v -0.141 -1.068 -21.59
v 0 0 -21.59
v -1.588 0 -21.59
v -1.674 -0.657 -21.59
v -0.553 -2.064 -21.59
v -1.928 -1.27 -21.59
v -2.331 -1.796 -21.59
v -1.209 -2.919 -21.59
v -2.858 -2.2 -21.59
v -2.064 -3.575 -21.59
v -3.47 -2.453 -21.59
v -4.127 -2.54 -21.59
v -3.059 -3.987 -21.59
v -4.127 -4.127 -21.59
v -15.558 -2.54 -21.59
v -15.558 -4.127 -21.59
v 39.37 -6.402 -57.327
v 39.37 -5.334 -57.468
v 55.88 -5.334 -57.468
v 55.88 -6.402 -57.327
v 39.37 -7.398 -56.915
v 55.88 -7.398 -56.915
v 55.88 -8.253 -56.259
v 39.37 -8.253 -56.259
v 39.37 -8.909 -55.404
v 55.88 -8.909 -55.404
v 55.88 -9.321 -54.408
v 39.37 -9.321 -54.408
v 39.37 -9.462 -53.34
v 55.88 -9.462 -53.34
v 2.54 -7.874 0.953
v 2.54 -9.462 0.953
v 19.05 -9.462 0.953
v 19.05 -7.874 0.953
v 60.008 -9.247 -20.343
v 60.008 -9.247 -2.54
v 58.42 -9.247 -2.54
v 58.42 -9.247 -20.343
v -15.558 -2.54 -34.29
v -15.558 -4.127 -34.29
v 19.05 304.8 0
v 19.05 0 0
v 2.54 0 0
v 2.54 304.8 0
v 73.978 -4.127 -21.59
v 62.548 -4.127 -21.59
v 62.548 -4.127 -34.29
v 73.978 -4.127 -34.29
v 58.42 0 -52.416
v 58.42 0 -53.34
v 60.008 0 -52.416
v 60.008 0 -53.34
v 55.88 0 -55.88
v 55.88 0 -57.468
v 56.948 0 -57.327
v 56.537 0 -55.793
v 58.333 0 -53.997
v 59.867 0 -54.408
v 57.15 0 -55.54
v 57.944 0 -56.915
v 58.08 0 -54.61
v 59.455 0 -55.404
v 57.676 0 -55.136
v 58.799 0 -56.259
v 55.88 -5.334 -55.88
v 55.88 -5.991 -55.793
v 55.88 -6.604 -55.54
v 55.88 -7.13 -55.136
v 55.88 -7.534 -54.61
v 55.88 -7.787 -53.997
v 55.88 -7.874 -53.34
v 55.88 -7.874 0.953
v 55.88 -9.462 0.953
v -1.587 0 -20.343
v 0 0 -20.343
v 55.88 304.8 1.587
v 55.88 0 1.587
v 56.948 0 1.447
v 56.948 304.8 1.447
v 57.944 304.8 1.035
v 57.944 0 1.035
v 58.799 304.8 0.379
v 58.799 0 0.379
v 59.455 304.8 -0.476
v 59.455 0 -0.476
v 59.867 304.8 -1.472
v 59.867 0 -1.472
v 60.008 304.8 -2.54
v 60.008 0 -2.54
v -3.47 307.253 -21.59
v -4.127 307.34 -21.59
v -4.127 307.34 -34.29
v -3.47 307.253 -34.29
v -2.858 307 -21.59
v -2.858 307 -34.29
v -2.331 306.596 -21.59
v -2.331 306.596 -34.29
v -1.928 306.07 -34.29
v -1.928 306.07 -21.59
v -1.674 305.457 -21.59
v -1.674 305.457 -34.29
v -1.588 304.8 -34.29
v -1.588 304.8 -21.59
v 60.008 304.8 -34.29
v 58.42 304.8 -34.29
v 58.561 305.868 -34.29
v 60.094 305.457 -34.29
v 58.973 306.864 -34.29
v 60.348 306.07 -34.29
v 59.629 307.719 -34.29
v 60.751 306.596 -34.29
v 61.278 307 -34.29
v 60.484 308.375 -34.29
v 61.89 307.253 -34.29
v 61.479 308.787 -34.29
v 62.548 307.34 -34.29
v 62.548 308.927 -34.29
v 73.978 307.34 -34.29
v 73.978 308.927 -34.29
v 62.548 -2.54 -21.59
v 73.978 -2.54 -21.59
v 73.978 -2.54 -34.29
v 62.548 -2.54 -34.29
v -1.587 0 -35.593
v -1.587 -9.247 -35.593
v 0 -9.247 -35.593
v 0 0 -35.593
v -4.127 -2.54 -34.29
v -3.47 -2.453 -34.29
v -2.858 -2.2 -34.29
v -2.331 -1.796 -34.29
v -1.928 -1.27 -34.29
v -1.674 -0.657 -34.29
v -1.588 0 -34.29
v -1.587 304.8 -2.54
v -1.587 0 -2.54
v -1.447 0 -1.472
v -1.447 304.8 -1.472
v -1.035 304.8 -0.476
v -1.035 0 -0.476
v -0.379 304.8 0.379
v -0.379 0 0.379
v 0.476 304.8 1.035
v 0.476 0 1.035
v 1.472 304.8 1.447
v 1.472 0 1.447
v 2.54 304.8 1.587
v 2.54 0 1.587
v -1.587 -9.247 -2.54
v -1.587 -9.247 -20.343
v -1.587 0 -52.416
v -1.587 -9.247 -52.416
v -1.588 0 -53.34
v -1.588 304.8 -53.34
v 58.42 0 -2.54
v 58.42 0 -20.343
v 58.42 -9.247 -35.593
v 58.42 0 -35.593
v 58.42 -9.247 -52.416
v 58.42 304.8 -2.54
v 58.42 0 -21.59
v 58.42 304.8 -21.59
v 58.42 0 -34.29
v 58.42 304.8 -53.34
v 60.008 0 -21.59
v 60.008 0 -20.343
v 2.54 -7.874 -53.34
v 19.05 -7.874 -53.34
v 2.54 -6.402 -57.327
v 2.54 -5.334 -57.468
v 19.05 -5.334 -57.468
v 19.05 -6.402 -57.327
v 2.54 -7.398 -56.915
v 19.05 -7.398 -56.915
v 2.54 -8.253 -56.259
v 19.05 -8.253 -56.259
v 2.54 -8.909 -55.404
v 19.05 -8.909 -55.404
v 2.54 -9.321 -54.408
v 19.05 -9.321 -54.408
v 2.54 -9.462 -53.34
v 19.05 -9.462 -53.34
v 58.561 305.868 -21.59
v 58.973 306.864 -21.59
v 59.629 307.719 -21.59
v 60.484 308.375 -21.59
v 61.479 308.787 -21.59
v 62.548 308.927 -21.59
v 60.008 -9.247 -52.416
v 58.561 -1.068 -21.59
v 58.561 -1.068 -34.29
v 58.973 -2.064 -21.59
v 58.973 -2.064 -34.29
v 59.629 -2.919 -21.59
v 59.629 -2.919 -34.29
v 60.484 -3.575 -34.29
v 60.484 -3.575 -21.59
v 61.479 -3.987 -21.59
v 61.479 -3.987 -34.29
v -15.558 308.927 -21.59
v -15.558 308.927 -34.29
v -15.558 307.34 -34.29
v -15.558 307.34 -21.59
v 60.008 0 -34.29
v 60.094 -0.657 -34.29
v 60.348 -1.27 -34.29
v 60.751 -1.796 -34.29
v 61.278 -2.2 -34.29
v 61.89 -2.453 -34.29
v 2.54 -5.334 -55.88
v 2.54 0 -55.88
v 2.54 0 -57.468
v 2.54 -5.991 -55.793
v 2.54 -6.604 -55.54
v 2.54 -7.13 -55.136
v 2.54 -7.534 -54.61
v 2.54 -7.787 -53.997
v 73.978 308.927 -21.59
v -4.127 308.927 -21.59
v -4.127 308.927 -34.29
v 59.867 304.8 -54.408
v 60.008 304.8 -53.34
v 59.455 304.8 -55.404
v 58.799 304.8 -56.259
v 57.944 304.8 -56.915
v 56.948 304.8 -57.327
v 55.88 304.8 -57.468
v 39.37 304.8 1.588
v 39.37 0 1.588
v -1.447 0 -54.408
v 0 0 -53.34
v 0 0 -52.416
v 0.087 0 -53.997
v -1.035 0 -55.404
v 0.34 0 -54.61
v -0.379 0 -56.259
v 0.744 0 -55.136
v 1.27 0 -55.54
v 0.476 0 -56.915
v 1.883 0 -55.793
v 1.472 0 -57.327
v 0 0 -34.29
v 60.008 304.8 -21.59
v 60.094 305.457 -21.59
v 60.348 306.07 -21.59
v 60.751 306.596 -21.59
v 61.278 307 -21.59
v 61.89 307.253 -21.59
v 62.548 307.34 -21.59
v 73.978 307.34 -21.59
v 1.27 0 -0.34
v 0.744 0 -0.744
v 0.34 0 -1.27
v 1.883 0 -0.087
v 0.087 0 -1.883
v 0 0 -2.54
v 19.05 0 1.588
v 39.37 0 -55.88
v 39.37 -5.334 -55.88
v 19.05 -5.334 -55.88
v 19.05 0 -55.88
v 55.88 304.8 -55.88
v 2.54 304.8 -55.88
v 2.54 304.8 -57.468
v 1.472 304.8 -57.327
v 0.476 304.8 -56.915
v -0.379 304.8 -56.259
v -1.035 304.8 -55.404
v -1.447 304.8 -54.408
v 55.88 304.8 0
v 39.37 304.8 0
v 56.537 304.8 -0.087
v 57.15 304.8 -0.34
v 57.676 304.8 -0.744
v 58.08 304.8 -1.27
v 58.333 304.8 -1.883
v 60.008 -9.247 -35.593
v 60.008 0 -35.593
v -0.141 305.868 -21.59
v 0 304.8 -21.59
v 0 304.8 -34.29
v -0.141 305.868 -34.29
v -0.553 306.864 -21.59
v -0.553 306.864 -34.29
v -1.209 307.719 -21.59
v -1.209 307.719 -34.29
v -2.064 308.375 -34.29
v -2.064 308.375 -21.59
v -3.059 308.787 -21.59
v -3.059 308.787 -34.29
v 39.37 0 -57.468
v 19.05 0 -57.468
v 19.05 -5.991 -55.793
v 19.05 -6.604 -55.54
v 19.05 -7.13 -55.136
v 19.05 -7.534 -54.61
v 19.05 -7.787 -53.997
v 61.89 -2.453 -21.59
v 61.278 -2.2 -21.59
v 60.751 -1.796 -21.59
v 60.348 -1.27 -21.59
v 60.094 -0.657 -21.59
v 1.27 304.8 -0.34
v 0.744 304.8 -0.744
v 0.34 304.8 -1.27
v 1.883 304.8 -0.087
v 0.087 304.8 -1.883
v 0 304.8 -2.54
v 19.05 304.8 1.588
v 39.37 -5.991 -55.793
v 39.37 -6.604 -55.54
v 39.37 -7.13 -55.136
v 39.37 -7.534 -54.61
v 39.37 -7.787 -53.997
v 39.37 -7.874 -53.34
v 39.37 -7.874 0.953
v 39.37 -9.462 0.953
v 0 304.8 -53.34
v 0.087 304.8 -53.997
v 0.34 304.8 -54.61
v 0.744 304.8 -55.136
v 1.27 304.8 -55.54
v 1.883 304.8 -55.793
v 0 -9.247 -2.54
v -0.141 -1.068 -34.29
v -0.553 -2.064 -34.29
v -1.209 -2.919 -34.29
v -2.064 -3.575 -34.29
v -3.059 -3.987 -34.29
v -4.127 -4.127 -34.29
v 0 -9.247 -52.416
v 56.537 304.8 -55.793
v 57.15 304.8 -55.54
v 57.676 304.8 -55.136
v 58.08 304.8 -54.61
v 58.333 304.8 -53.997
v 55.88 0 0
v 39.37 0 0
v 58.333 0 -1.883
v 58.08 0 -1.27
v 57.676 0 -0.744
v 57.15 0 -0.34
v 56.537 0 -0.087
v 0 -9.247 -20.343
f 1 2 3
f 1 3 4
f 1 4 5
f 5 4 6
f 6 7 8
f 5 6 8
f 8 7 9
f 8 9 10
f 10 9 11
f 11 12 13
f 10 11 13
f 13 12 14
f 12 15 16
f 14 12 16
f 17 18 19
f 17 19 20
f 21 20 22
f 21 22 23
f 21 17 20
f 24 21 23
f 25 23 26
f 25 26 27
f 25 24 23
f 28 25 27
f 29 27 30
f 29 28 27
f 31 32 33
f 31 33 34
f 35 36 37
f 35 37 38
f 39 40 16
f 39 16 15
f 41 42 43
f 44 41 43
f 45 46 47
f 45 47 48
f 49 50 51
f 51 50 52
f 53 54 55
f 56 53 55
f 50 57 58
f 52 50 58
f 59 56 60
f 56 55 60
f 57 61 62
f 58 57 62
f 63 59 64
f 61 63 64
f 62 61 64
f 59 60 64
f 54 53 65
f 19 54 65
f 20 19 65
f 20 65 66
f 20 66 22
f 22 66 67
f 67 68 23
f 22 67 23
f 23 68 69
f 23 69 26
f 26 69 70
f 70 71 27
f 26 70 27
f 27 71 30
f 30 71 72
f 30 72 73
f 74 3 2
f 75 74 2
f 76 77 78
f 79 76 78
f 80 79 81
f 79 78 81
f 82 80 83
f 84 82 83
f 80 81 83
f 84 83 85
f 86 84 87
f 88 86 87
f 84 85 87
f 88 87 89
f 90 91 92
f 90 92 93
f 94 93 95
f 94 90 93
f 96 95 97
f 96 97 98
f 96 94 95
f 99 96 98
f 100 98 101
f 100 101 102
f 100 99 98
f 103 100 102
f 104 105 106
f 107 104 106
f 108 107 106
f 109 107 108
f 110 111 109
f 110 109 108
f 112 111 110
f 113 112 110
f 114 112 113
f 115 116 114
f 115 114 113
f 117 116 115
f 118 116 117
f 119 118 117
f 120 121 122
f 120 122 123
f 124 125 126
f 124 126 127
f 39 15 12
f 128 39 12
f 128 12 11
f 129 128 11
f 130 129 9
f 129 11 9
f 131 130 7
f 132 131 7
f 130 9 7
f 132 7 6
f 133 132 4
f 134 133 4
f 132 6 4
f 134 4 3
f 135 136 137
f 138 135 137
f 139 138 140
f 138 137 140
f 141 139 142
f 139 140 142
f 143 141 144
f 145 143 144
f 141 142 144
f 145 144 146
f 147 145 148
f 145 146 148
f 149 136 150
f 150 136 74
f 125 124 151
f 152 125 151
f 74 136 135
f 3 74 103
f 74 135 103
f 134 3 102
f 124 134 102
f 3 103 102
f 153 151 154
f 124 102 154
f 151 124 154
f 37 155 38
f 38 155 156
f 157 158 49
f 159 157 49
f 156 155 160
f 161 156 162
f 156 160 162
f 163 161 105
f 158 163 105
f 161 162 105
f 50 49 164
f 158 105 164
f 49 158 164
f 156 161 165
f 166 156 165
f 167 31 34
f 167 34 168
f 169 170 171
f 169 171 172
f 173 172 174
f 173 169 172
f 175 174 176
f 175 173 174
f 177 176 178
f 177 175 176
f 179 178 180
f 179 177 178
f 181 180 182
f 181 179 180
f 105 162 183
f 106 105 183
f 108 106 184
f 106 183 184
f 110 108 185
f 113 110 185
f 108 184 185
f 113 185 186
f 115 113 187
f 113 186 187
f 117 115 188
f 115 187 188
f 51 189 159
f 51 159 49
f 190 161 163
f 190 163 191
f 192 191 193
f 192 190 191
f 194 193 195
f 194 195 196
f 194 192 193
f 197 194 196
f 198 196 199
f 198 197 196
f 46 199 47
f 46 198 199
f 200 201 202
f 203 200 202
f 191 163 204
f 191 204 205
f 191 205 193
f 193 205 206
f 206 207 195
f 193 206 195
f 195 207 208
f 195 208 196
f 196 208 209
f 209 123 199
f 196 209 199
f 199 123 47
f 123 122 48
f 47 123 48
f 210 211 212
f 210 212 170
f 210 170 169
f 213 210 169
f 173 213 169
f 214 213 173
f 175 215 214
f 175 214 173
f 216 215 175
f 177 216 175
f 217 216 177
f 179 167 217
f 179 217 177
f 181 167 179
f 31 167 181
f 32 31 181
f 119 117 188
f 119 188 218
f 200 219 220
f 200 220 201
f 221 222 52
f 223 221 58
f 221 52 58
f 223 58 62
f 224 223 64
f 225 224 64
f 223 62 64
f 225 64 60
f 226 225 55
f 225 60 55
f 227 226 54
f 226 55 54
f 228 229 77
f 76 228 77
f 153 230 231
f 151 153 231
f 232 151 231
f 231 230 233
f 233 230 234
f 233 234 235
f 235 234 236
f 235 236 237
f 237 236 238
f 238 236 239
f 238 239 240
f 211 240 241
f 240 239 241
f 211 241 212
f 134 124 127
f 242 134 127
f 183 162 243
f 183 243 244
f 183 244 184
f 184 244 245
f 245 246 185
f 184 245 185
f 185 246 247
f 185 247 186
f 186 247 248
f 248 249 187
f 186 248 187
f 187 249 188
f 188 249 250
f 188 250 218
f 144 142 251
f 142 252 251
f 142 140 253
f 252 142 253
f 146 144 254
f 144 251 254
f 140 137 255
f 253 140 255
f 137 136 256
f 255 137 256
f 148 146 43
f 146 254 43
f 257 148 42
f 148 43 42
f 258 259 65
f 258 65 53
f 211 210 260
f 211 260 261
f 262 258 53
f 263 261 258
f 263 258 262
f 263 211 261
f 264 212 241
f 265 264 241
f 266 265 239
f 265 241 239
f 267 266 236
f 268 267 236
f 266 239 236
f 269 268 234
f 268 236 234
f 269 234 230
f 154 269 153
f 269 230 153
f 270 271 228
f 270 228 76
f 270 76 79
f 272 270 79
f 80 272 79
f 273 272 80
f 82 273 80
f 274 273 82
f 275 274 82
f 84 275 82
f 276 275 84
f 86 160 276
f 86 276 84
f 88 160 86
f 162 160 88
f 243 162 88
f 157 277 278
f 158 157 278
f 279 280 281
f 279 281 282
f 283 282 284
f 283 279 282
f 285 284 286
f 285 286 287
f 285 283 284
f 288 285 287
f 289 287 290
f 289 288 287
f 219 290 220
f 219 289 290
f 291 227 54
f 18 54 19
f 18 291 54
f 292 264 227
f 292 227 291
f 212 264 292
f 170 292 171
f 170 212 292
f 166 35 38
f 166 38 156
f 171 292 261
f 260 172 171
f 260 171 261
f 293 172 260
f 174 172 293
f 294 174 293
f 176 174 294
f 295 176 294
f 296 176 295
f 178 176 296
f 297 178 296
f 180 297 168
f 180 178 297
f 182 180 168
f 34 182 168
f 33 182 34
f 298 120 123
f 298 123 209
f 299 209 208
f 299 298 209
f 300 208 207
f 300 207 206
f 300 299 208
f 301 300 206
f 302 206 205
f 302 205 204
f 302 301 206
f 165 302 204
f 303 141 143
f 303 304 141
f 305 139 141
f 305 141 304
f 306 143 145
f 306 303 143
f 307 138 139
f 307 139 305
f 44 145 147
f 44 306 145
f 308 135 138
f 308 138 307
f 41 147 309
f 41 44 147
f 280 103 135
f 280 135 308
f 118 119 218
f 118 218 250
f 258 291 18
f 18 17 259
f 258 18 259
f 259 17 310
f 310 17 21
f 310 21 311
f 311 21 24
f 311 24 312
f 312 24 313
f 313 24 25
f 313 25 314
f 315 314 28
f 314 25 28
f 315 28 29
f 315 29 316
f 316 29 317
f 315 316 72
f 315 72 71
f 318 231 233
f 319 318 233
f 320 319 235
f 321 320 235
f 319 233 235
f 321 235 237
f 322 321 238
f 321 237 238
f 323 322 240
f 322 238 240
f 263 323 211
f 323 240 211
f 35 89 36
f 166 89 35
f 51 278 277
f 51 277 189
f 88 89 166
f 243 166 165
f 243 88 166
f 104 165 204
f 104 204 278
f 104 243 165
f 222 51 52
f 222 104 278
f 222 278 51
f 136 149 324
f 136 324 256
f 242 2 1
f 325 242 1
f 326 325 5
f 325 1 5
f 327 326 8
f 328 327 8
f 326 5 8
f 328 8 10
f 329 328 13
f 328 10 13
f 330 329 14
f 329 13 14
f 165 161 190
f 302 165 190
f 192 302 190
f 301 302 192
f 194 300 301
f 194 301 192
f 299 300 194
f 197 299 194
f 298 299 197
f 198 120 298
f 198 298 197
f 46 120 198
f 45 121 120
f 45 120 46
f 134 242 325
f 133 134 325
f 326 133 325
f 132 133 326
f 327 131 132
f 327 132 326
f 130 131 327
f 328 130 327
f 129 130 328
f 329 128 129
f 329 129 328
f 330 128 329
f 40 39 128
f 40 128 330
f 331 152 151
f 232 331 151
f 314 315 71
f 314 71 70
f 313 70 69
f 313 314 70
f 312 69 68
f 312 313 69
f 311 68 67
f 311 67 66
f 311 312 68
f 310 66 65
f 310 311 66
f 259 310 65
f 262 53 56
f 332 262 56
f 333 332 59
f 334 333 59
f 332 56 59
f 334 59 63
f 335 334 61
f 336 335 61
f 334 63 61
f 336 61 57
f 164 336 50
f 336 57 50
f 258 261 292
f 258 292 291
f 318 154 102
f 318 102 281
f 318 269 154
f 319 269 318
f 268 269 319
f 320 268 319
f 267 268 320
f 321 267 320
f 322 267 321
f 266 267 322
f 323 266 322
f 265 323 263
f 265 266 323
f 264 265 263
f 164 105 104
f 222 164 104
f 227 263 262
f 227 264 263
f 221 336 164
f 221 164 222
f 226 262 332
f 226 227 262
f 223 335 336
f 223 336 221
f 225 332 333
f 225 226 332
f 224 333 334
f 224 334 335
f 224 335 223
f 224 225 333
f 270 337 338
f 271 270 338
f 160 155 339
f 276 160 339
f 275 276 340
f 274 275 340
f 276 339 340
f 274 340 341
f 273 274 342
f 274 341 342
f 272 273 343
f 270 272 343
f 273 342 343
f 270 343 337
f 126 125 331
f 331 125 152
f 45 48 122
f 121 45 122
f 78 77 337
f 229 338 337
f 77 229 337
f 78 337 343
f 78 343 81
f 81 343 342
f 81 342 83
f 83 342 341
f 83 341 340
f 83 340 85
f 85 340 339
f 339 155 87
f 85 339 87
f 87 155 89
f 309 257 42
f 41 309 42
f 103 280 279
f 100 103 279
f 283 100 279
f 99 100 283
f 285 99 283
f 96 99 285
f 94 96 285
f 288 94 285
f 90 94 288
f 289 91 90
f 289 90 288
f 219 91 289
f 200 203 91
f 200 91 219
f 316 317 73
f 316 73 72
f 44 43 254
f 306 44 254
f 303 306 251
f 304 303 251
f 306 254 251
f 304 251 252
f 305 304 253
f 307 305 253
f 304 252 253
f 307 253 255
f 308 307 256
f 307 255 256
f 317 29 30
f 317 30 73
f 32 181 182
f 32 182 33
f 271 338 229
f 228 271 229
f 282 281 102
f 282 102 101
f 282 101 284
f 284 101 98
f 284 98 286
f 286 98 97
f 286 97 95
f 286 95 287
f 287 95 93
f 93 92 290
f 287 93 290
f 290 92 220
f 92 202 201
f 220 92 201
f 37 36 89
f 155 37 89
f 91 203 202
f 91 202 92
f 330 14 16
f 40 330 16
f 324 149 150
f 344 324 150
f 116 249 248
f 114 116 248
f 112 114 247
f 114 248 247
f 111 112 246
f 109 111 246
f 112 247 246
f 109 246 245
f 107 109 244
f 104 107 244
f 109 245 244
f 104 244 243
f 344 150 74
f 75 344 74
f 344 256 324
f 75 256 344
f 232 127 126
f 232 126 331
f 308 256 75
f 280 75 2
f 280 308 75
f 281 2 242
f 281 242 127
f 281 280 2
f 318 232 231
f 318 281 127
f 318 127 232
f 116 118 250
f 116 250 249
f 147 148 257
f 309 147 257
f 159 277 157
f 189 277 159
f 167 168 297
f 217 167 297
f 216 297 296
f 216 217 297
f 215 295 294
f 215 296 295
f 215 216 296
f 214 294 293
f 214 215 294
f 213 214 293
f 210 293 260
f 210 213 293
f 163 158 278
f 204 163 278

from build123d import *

# Parameters (mm, degrees)
BASE_FLANGE1_DEPTH   = 304.8
EDGE_FLANGE3_DEPTH   = 53.34
SKETCH14_W           = 20.32
SKETCH14_H           = 69.210930463
CUT_EXTRUDE1_DEPTH   = 9.4615
EDGE_FLANGE4_DEPTH   = 12.7
MIRROR2_COPY_1_DEPTH = 12.7
SKETCH22_W           = 17.803399203
SKETCH22_H           = 9.246782325
SKETCH22_W_2         = 16.822955406
TAB1_DEPTH           = 1.5875


# Sheet-metal steps are written as plain solids
with BuildPart() as part:
    # Sketch1 → Base-Flange1 (new body)
    with BuildSketch(Plane(origin=(0, 0, 0), x_dir=(1, 0, 0), z_dir=(0, 1, 0))):
        with BuildLine():
            Line((19.05, 0), (2.54, 0))
            ThreePointArc((2.54, 0), (0.743948776, 0.743948776), (0, 2.54))
            Line((0, 2.54), (0, 53.34))
            ThreePointArc((0, 53.34), (0.743948776, 55.136051224), (2.54, 55.88))
            Line((2.54, 55.88), (55.88, 55.88))
            ThreePointArc((55.88, 55.88), (57.676051224, 55.136051224), (58.42, 53.34))
            Line((58.42, 53.34), (58.42, 2.54))
            ThreePointArc((58.42, 2.54), (57.676051224, 0.743948776), (55.88, 0))
            Line((55.88, 0), (39.37, 0))
            Line((39.37, 0), (39.37, -1.5875))
            Line((39.37, -1.5875), (55.88, -1.5875))
            ThreePointArc((55.88, -1.5875), (58.798583239, -0.378583239), (60.0075, 2.54))
            Line((60.0075, 2.54), (60.0075, 53.34))
            ThreePointArc((60.0075, 53.34), (58.798583239, 56.258583239), (55.88, 57.4675))
            Line((55.88, 57.4675), (2.54, 57.4675))
            ThreePointArc((2.54, 57.4675), (-0.378583239, 56.258583239), (-1.5875, 53.34))
            Line((-1.5875, 53.34), (-1.5875, 2.54))
            ThreePointArc((-1.5875, 2.54), (-0.378583239, -0.378583239), (2.54, -1.5875))
            Line((2.54, -1.5875), (19.05, -1.5875))
            Line((19.05, -1.5875), (19.05, 0))
        make_face()
    extrude(amount=BASE_FLANGE1_DEPTH)

    # Edge-Flange3 section (across the edge) → Edge-Flange3 (add)
    with BuildSketch(Plane(origin=(2.54, -7.874, -55.88), x_dir=(0, 1, 0), z_dir=(1, 0, 0))):
        with BuildLine():
            Line((-1.5875, 2.54), (-1.5875, 56.8325))
            Line((-1.5875, 56.8325), (0, 56.8325))
            Line((0, 56.8325), (0, 2.54))
            ThreePointArc((0, 2.54), (0.743948776, 0.743948776), (2.54, 0))
            Line((2.54, 0), (7.874, 0))
            Line((7.874, 0), (7.874, -1.5875))
            Line((7.874, -1.5875), (2.54, -1.5875))
            ThreePointArc((2.54, -1.5875), (-0.378583239, -0.378583239), (-1.5875, 2.54))
        make_face()
    extrude(amount=EDGE_FLANGE3_DEPTH)

    # Sketch14 → Cut-Extrude1 (cut)
    with BuildSketch(Plane.XZ.offset(9.4615)):
        with Locations((29.21, -26.70801644)):
            Rectangle(SKETCH14_W, SKETCH14_H)
    extrude(amount=-CUT_EXTRUDE1_DEPTH, mode=Mode.SUBTRACT)

    # Edge-Flange4 section (across the edge) → Edge-Flange4 (add)
    with BuildSketch(Plane(origin=(-1.5875, 307.34, -21.59), x_dir=(0, -1, 0), z_dir=(0, 0, -1))):
        with BuildLine():
            Line((-1.5875, 2.54), (-1.5875, 13.97))
            Line((-1.5875, 13.97), (0, 13.97))
            Line((0, 13.97), (0, 2.54))
            ThreePointArc((0, 2.54), (0.743948776, 0.743948776), (2.54, 0))
            Line((2.54, 0), (2.54, -1.5875))
            ThreePointArc((2.54, -1.5875), (-0.378583239, -0.378583239), (-1.5875, 2.54))
        make_face()
    edge_flange4 = extrude(amount=EDGE_FLANGE4_DEPTH)

    # Mirror1: Edge-Flange4 across plane
    add(edge_flange4.mirror(Plane(origin=(29.21, 0, 0), x_dir=(0, 0, 1), z_dir=(1, 0, 0))))

    # Mirror2: Edge-Flange4 across plane
    add(edge_flange4.mirror(Plane.ZX.offset(152.4)))

    # Mirror2 copy 1 sketch → Mirror2 copy 1 (add)
    with BuildSketch(Plane(origin=(60.0075, -2.54, -21.59), x_dir=(0, 1, 0), z_dir=(0, 0, -1))):
        with BuildLine():
            Line((-1.5875, 2.54), (-1.5875, 13.97))
            Line((-1.5875, 13.97), (0, 13.97))
            Line((0, 13.97), (0, 2.54))
            ThreePointArc((0, 2.54), (0.743948776, 0.743948776), (2.54, 0))
            Line((2.54, 0), (2.54, -1.5875))
            ThreePointArc((2.54, -1.5875), (-0.378583239, -0.378583239), (-1.5875, 2.54))
        make_face()
    extrude(amount=MIRROR2_COPY_1_DEPTH)

    # Sketch22 → Tab1 (add)
    with BuildSketch(Plane(origin=(60.0075, 0, 0), x_dir=(0, 0, -1), z_dir=(1, 0, 0))):
        with Locations((11.441699601, -4.623391162)):
            Rectangle(SKETCH22_W, SKETCH22_H)
        with Locations((44.004958561, -4.623391162)):
            Rectangle(SKETCH22_W_2, SKETCH22_H)
    tab1 = extrude(amount=-TAB1_DEPTH)

    # Mirror3: Tab1 across plane
    add(tab1.mirror(Plane(origin=(29.21, 0, 0), x_dir=(0, 0, 1), z_dir=(1, 0, 0))))


solid = part.part
